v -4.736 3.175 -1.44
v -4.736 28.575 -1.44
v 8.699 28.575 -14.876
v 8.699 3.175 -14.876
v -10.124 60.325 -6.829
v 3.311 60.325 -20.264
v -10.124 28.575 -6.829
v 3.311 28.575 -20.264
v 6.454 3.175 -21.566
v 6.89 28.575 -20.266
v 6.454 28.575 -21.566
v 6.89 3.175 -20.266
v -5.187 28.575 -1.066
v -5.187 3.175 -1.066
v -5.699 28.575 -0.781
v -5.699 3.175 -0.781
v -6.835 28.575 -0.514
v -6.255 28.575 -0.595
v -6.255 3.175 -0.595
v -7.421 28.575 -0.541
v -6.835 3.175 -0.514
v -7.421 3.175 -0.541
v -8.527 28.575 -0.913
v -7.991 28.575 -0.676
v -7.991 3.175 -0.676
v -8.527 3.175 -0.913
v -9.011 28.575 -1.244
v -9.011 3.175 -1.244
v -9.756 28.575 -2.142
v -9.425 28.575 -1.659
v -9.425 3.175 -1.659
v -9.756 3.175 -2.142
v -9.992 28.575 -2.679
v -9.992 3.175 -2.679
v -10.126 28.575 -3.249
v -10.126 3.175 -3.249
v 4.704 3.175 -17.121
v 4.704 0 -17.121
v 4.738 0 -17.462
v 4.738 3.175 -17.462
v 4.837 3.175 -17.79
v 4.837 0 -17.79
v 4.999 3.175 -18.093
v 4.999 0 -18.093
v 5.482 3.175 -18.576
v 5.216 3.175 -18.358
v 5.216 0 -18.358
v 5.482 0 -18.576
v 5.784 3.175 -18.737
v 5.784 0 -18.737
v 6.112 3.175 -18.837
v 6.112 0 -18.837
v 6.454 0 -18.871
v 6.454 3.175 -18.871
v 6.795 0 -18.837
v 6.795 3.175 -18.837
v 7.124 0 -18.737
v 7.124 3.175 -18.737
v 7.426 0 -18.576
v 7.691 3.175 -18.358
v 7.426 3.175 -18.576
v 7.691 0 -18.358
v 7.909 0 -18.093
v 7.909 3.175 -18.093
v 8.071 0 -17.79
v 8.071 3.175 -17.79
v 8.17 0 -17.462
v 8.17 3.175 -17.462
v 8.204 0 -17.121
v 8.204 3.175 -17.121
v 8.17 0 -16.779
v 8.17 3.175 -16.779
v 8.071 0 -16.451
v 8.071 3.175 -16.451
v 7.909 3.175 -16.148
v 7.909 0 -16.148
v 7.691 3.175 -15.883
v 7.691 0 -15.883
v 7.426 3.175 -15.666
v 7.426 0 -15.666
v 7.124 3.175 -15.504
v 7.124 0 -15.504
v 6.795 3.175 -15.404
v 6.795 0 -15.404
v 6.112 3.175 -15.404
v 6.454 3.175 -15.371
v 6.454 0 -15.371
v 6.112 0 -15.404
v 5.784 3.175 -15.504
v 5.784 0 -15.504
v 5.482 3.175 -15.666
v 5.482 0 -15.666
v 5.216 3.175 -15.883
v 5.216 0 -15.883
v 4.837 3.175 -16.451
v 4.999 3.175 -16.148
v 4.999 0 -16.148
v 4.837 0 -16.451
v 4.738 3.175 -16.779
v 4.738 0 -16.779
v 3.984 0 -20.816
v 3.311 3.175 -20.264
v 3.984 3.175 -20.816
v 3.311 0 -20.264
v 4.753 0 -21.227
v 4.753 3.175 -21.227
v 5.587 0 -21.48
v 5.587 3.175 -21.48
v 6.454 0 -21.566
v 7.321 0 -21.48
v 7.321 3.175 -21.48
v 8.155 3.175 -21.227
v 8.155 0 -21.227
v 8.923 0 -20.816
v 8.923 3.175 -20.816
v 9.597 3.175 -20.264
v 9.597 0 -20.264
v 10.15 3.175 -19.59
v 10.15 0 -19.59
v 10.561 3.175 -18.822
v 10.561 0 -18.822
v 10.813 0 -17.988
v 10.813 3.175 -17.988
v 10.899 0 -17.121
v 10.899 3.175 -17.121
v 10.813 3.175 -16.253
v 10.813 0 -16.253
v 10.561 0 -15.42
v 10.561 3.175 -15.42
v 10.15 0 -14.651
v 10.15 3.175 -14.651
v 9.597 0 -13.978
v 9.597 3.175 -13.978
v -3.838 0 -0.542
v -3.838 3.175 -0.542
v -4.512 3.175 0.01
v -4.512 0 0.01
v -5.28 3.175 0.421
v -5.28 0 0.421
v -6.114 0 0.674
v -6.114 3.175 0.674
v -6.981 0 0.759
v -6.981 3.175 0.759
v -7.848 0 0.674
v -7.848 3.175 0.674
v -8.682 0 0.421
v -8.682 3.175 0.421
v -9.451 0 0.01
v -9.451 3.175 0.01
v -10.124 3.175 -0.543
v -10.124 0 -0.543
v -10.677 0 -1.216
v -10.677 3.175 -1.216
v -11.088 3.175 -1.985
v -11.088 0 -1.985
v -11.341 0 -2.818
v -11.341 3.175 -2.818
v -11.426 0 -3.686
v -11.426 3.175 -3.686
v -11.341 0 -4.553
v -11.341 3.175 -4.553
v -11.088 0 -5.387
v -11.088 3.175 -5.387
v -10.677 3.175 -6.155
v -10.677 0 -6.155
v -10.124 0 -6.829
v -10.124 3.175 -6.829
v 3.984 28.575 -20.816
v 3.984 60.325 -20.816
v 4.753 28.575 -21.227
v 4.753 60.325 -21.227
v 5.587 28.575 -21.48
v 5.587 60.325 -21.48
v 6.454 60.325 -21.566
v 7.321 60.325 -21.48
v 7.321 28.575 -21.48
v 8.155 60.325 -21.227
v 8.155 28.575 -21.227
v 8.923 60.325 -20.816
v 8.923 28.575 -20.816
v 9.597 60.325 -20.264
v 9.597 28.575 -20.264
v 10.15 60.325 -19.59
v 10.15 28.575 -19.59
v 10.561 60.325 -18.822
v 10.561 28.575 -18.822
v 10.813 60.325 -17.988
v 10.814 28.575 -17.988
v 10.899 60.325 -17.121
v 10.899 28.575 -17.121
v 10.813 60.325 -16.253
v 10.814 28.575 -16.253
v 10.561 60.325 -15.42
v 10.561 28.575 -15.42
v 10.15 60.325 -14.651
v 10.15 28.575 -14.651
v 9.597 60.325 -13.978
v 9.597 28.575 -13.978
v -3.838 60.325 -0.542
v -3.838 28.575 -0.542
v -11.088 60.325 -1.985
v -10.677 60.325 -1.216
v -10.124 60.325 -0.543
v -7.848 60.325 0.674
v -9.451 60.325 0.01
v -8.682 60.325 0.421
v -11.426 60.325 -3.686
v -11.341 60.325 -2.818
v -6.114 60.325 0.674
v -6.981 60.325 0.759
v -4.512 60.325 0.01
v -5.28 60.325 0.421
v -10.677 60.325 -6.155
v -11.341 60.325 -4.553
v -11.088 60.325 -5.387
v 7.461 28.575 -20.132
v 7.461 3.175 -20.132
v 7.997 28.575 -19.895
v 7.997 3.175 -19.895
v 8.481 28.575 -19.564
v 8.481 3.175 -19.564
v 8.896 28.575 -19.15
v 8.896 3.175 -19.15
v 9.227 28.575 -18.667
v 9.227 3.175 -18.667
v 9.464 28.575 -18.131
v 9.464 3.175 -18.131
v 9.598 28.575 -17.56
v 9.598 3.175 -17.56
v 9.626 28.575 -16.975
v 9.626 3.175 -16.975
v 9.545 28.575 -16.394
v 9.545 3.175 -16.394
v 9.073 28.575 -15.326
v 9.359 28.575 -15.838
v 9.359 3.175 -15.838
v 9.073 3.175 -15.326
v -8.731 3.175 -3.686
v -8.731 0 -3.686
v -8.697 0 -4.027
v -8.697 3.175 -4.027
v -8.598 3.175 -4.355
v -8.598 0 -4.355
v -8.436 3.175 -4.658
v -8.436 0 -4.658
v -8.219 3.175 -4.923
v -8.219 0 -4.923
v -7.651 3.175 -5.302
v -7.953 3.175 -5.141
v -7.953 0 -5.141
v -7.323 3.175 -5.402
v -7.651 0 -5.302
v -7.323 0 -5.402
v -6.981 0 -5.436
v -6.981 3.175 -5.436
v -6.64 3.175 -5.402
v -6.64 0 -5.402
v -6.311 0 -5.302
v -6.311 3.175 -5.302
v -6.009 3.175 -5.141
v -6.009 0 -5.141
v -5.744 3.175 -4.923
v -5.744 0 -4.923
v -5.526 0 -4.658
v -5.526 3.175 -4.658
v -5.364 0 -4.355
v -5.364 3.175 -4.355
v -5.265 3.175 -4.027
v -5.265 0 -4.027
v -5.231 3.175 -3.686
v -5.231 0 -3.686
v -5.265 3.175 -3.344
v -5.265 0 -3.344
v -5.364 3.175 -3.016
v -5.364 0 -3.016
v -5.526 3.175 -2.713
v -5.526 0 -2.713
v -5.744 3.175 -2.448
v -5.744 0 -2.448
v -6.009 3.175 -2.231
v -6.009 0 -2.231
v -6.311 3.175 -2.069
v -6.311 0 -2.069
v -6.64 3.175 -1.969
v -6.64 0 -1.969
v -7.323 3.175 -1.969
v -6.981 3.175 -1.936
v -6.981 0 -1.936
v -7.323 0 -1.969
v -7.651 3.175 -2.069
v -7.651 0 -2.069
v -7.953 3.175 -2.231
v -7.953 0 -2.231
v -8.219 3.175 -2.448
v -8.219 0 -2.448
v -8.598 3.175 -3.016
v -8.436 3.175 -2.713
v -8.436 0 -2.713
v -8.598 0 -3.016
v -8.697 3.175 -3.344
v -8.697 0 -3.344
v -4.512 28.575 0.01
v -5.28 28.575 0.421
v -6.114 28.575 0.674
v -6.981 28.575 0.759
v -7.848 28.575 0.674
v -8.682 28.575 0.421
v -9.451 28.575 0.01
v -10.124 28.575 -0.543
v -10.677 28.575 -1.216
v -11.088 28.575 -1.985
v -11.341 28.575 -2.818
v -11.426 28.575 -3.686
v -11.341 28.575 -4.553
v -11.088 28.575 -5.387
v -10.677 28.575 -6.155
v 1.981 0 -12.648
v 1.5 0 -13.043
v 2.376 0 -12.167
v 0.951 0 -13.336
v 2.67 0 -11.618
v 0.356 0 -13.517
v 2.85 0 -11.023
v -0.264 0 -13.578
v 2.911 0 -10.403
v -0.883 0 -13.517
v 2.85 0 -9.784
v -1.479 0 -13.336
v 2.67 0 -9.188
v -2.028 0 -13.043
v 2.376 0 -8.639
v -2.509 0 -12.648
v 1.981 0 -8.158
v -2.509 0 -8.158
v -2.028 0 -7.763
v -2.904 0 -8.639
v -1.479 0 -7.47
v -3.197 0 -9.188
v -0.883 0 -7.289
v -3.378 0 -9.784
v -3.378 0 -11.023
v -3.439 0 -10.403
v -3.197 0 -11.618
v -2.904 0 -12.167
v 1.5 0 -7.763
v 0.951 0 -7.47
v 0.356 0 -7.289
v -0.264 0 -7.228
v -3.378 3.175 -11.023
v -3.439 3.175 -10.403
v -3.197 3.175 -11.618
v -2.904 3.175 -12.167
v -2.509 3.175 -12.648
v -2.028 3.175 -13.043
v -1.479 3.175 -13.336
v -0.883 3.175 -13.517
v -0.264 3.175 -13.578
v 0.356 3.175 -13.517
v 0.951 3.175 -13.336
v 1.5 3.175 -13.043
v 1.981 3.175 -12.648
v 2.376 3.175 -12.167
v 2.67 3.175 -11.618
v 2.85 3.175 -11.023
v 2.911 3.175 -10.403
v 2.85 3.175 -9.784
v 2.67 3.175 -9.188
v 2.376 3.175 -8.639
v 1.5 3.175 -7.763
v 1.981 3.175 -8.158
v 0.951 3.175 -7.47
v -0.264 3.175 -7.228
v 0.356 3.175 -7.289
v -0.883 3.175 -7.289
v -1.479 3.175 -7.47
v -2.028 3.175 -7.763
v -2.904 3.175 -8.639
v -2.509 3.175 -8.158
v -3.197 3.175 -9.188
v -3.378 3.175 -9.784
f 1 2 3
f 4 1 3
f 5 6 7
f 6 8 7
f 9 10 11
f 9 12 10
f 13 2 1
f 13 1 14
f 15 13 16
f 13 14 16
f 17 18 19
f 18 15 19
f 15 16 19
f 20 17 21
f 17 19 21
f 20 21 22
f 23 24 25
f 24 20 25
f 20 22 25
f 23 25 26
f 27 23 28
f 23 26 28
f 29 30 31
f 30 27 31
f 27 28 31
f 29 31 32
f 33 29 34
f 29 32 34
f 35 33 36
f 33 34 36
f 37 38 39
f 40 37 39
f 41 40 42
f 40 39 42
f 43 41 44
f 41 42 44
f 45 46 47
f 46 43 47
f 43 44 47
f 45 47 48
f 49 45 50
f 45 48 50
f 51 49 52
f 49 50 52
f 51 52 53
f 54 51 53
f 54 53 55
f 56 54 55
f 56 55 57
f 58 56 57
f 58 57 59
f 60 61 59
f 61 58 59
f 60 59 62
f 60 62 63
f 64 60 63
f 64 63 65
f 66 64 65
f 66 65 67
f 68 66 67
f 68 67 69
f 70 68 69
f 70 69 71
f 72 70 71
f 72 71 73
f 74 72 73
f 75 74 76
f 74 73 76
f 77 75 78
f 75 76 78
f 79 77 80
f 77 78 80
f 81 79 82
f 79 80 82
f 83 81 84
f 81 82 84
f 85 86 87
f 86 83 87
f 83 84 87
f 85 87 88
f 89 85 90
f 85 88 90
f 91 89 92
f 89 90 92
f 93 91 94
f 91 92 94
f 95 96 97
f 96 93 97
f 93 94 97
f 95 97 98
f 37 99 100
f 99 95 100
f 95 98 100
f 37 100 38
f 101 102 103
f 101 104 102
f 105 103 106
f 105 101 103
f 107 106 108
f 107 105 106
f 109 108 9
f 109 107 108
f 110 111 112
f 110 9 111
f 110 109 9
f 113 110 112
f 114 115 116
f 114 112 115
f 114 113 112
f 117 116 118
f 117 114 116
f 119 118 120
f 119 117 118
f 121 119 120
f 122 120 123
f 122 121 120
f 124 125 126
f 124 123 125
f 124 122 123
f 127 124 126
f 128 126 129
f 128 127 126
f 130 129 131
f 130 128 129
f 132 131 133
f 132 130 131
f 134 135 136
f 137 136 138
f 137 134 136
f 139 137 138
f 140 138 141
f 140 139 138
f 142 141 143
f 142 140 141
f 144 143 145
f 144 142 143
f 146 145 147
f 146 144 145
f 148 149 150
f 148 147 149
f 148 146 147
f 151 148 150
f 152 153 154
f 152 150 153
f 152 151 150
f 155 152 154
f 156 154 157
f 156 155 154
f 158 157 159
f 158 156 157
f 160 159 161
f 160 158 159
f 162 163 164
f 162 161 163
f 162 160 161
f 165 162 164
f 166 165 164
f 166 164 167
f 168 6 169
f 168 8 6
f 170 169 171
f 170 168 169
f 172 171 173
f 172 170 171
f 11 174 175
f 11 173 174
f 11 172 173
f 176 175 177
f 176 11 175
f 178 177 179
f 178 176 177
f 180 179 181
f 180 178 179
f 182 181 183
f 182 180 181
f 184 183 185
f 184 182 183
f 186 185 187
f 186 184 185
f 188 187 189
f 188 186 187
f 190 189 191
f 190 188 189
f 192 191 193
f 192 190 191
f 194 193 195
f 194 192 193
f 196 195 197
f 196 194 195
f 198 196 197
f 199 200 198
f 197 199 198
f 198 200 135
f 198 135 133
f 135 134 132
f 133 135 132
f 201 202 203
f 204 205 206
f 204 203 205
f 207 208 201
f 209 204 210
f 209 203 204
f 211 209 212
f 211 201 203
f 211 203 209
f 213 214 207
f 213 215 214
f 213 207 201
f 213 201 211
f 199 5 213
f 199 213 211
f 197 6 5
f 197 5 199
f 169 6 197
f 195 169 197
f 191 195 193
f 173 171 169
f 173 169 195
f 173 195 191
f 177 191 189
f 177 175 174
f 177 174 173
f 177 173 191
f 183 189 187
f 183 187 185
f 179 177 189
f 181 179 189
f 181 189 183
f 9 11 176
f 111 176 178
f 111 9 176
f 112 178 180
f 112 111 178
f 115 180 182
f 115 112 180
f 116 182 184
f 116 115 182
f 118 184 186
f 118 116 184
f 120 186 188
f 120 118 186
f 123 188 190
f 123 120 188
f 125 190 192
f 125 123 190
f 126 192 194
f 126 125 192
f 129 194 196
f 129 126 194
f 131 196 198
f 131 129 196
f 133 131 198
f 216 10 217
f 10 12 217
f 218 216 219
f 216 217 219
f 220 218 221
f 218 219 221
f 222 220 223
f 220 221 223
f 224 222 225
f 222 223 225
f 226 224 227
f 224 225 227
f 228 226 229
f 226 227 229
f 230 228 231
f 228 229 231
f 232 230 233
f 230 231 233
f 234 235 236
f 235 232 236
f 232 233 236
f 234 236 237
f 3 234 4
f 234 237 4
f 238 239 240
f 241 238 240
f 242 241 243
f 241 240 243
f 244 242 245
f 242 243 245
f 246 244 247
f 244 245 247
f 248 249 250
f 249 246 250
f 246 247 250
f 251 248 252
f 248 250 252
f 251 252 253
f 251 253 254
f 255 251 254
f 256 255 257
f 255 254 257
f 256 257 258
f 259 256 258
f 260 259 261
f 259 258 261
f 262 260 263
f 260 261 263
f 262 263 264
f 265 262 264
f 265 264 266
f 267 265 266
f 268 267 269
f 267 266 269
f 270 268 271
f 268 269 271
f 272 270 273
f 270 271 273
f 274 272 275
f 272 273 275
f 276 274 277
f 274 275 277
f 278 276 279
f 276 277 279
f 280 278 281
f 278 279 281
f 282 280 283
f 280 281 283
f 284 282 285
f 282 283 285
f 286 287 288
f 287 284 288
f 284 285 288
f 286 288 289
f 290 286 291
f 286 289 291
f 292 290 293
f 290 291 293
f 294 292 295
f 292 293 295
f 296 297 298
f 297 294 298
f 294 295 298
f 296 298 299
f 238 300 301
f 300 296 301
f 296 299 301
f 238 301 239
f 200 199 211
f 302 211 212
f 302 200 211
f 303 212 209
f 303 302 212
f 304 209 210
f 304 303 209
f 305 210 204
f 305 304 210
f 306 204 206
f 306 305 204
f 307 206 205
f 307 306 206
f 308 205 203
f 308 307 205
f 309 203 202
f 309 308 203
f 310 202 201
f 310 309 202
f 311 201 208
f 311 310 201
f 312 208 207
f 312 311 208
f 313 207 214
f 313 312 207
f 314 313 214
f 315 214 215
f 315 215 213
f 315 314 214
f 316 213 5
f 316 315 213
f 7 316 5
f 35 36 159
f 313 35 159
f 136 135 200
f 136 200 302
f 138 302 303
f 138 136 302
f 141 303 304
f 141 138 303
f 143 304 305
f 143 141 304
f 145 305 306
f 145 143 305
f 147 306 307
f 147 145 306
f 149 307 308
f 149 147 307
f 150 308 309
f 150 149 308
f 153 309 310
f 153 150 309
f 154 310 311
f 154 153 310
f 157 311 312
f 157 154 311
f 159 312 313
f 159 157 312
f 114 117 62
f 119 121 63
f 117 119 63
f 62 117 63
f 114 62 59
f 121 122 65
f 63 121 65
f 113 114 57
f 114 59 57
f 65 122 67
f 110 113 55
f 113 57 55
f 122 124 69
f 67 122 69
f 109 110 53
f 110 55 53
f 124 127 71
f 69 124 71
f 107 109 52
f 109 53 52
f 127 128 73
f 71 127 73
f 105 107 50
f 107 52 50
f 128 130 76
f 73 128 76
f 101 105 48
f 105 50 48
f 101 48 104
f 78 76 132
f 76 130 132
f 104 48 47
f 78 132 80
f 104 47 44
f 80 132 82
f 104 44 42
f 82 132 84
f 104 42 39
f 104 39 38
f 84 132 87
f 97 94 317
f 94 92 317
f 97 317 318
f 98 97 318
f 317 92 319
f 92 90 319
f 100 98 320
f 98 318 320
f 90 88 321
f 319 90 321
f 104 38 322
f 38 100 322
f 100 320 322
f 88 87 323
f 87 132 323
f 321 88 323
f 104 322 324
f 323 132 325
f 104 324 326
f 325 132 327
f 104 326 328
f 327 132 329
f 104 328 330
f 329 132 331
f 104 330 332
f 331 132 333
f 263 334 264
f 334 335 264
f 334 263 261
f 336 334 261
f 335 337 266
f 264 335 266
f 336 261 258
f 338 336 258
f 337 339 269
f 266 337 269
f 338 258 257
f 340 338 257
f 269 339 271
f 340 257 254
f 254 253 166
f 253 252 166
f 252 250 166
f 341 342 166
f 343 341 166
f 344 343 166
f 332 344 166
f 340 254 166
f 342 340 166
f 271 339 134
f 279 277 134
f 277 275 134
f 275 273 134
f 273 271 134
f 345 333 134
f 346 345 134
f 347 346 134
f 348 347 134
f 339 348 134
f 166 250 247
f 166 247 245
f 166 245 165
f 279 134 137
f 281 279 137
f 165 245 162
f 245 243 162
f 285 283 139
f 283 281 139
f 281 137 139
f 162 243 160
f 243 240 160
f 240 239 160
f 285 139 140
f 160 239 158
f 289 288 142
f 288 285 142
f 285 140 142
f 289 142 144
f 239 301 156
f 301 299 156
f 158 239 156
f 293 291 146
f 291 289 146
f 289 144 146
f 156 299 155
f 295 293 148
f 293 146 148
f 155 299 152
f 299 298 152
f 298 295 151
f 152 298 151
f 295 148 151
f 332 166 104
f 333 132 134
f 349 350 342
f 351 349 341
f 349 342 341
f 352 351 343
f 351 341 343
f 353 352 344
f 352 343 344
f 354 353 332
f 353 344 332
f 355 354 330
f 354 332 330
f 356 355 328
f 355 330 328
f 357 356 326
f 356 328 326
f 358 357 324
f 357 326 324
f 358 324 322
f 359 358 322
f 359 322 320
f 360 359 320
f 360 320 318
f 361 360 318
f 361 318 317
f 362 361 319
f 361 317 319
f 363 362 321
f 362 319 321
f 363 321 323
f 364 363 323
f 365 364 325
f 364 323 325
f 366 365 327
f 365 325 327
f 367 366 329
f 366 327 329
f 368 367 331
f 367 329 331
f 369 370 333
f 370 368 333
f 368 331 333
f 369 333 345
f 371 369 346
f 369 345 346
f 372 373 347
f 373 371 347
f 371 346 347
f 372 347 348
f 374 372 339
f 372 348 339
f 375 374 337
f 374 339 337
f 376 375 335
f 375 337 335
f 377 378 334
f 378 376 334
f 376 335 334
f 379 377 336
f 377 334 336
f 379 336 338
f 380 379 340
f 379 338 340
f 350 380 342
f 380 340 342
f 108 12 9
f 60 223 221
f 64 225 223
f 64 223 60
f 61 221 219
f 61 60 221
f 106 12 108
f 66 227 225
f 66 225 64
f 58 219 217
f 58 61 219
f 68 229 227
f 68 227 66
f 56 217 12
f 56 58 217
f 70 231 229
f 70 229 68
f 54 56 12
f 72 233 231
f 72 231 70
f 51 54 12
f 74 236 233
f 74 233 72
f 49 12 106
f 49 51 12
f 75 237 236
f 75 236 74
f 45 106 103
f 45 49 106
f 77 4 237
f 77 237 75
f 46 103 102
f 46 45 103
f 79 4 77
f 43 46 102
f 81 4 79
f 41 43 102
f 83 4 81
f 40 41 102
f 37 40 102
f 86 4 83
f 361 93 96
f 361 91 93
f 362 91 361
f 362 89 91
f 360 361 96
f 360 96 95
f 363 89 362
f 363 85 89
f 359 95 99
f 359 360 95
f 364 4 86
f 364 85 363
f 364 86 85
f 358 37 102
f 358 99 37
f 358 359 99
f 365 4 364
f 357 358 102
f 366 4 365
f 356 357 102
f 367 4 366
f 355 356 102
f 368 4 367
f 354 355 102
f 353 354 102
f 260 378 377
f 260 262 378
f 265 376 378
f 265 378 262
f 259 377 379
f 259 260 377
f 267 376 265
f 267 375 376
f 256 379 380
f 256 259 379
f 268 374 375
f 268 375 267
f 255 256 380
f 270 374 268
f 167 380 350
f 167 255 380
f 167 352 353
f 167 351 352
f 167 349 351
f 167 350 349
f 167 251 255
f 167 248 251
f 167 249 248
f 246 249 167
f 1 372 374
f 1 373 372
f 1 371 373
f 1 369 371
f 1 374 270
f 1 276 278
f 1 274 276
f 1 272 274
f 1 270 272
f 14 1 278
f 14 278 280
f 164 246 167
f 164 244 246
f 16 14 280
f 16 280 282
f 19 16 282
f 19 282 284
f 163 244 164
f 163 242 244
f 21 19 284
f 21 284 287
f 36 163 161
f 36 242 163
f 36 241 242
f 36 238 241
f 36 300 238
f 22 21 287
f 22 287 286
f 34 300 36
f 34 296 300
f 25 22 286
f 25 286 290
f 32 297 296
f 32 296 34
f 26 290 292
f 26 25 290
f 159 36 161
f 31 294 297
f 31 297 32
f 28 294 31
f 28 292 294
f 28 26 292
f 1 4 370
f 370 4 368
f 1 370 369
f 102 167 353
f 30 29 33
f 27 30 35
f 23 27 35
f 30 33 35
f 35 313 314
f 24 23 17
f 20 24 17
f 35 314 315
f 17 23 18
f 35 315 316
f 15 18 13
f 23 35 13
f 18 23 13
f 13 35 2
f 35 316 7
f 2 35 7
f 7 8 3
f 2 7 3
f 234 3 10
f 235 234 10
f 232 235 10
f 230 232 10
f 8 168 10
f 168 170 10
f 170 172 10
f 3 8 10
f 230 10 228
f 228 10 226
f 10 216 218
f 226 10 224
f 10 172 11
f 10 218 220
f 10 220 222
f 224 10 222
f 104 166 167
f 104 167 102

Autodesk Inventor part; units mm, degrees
ref_plane "YZ Plane" through (0, 0, 0) normal (1, 0, 0) x (0, 1, 0)
ref_plane "XZ Plane" through (0, 0, 0) normal (0, 1, 0) x (-1, 0, 0)
ref_plane "XY Plane" through (0, 0, 0) normal (0, 0, 1) x (1, 0, 0)
sketch "Sketch1" plane through (0, 0, 0) normal (0, 1, 0) x (-1, 0, 0)
  circle A0 centre (0.2636, -10.4031) radius 3.175
  line L0 (0.2636, -10.4031) -> (6.9811, -3.6856)
  line L1 (0.2636, -10.4031) -> (6.0619, -16.2014)
  line L2 (0.2636, -10.4031) -> (-5.5347, -4.6048)
  line L3 (0.2636, -10.4031) -> (-6.4539, -17.1206)
  circle A1 centre (6.9811, -3.6856) radius 1.75
  circle A2 centre (6.0619, -16.2014) radius 1.75
  circle A3 centre (-6.4539, -17.1206) radius 1.75
  circle A4 centre (-5.5347, -4.6048) radius 1.75
  circle A5 centre (0.2636, -10.4031) radius 14.1446
  circle A6 centre (6.9811, -3.6856) radius 4.445
  circle A7 centre (-6.4539, -17.1206) radius 4.445
  line L4 (3.838, -0.5425) -> (-9.597, -13.9775)
  line L5 (10.1242, -6.8287) -> (-3.3108, -20.2637)
  circle A8 centre (6.9811, -3.6856) radius 2.3813
  point P0 (0, 0)
  dimension "d3" = 9.5
  dimension "d4" = 90
  dimension "d5" = 90
  dimension "d6" = 90
  dimension "d7" = 3.5
  dimension "d8" = 3.5
  dimension "d9" = 3.5
  dimension "d10" = 3.5
  dimension "d12" = 8.89
  dimension "d13" = 8.89
  dimension "d18" = 4.7625
extrude "Extrusion2" add sketch "Sketch1" along normal blind 3.175 contours A0 L0 A6 L5 L1 | A0 L2 L4 A6 L0 | L1 L5 A7 L3 A0 | A0 L3 A7 L4 L2 | A8 | A6 | A7
sketch "Sketch3" plane through (0, 3.175, 0) normal (0, 1, 0) x (1, 0, 0)
  circle A0 centre (-6.9811, 3.6856) radius 1.75 projected
  line L0 (-6.9811, 3.6856) -> (-6.9811, 13.6529)
  arc A1 (-11.4261, 3.6856) -> (-3.838, 0.5425) centre (-6.9811, 3.6856) ccw
  arc A2 (-10.126, 3.2493) -> (-4.7361, 1.4405) centre (-6.9811, 3.6856) ccw
  circle A3 centre (6.4539, 17.1206) radius 1.75 projected
  arc A4 (8.699, 14.8755) -> (6.8902, 20.2655) centre (6.4539, 17.1206) ccw
  arc A5 (9.597, 13.9775) -> (6.4539, 21.5656) centre (6.4539, 17.1206) ccw
  line L1 (-3.838, 0.5425) -> (9.597, 13.9775) projected
  line L2 (-3.838, 0.5425) -> (9.597, 13.9775)
  line L3 (-4.7361, 1.4405) -> (8.699, 14.8755)
  arc A6 (-10.1242, 6.8287) -> (-3.838, 0.5425) centre (-6.9811, 3.6856) ccw projected
  line L4 (6.8902, 20.2655) -> (6.4539, 21.5656)
  line L5 (-10.126, 3.2493) -> (-11.4261, 3.6856)
  point P0 (0, 0)
extrude "Extrusion3" add sketch "Sketch3" along normal blind 25.4 contours L5 A2 L3 A4 L4 A5 L1 A1
sketch "Sketch4" plane through (0, 28.575, 0) normal (0, 1, 0) x (1, 0, 0)
  circle A0 centre (-6.9811, 3.6856) radius 1.75 projected
  circle A1 centre (-6.9811, 3.6856) radius 4.445
  circle A2 centre (6.4539, 17.1206) radius 1.75 projected
  circle A3 centre (6.4539, 17.1206) radius 4.445
  arc A4 (-11.4261, 3.6856) -> (-3.838, 0.5425) centre (-6.9811, 3.6856) ccw projected
  line L0 (-3.838, 0.5425) -> (9.597, 13.9775)
  line L1 (3.3108, 20.2637) -> (-10.1242, 6.8287) projected
  line L2 (-10.1242, 6.8287) -> (3.3108, 20.2637)
  point P0 (0, 0)
extrude "Extrusion4" add sketch "Sketch4" along normal blind 31.75 contours A0 | A1 | A1 L1 A3 L0 | A3 | A2
properties part number "Drone_leg"
